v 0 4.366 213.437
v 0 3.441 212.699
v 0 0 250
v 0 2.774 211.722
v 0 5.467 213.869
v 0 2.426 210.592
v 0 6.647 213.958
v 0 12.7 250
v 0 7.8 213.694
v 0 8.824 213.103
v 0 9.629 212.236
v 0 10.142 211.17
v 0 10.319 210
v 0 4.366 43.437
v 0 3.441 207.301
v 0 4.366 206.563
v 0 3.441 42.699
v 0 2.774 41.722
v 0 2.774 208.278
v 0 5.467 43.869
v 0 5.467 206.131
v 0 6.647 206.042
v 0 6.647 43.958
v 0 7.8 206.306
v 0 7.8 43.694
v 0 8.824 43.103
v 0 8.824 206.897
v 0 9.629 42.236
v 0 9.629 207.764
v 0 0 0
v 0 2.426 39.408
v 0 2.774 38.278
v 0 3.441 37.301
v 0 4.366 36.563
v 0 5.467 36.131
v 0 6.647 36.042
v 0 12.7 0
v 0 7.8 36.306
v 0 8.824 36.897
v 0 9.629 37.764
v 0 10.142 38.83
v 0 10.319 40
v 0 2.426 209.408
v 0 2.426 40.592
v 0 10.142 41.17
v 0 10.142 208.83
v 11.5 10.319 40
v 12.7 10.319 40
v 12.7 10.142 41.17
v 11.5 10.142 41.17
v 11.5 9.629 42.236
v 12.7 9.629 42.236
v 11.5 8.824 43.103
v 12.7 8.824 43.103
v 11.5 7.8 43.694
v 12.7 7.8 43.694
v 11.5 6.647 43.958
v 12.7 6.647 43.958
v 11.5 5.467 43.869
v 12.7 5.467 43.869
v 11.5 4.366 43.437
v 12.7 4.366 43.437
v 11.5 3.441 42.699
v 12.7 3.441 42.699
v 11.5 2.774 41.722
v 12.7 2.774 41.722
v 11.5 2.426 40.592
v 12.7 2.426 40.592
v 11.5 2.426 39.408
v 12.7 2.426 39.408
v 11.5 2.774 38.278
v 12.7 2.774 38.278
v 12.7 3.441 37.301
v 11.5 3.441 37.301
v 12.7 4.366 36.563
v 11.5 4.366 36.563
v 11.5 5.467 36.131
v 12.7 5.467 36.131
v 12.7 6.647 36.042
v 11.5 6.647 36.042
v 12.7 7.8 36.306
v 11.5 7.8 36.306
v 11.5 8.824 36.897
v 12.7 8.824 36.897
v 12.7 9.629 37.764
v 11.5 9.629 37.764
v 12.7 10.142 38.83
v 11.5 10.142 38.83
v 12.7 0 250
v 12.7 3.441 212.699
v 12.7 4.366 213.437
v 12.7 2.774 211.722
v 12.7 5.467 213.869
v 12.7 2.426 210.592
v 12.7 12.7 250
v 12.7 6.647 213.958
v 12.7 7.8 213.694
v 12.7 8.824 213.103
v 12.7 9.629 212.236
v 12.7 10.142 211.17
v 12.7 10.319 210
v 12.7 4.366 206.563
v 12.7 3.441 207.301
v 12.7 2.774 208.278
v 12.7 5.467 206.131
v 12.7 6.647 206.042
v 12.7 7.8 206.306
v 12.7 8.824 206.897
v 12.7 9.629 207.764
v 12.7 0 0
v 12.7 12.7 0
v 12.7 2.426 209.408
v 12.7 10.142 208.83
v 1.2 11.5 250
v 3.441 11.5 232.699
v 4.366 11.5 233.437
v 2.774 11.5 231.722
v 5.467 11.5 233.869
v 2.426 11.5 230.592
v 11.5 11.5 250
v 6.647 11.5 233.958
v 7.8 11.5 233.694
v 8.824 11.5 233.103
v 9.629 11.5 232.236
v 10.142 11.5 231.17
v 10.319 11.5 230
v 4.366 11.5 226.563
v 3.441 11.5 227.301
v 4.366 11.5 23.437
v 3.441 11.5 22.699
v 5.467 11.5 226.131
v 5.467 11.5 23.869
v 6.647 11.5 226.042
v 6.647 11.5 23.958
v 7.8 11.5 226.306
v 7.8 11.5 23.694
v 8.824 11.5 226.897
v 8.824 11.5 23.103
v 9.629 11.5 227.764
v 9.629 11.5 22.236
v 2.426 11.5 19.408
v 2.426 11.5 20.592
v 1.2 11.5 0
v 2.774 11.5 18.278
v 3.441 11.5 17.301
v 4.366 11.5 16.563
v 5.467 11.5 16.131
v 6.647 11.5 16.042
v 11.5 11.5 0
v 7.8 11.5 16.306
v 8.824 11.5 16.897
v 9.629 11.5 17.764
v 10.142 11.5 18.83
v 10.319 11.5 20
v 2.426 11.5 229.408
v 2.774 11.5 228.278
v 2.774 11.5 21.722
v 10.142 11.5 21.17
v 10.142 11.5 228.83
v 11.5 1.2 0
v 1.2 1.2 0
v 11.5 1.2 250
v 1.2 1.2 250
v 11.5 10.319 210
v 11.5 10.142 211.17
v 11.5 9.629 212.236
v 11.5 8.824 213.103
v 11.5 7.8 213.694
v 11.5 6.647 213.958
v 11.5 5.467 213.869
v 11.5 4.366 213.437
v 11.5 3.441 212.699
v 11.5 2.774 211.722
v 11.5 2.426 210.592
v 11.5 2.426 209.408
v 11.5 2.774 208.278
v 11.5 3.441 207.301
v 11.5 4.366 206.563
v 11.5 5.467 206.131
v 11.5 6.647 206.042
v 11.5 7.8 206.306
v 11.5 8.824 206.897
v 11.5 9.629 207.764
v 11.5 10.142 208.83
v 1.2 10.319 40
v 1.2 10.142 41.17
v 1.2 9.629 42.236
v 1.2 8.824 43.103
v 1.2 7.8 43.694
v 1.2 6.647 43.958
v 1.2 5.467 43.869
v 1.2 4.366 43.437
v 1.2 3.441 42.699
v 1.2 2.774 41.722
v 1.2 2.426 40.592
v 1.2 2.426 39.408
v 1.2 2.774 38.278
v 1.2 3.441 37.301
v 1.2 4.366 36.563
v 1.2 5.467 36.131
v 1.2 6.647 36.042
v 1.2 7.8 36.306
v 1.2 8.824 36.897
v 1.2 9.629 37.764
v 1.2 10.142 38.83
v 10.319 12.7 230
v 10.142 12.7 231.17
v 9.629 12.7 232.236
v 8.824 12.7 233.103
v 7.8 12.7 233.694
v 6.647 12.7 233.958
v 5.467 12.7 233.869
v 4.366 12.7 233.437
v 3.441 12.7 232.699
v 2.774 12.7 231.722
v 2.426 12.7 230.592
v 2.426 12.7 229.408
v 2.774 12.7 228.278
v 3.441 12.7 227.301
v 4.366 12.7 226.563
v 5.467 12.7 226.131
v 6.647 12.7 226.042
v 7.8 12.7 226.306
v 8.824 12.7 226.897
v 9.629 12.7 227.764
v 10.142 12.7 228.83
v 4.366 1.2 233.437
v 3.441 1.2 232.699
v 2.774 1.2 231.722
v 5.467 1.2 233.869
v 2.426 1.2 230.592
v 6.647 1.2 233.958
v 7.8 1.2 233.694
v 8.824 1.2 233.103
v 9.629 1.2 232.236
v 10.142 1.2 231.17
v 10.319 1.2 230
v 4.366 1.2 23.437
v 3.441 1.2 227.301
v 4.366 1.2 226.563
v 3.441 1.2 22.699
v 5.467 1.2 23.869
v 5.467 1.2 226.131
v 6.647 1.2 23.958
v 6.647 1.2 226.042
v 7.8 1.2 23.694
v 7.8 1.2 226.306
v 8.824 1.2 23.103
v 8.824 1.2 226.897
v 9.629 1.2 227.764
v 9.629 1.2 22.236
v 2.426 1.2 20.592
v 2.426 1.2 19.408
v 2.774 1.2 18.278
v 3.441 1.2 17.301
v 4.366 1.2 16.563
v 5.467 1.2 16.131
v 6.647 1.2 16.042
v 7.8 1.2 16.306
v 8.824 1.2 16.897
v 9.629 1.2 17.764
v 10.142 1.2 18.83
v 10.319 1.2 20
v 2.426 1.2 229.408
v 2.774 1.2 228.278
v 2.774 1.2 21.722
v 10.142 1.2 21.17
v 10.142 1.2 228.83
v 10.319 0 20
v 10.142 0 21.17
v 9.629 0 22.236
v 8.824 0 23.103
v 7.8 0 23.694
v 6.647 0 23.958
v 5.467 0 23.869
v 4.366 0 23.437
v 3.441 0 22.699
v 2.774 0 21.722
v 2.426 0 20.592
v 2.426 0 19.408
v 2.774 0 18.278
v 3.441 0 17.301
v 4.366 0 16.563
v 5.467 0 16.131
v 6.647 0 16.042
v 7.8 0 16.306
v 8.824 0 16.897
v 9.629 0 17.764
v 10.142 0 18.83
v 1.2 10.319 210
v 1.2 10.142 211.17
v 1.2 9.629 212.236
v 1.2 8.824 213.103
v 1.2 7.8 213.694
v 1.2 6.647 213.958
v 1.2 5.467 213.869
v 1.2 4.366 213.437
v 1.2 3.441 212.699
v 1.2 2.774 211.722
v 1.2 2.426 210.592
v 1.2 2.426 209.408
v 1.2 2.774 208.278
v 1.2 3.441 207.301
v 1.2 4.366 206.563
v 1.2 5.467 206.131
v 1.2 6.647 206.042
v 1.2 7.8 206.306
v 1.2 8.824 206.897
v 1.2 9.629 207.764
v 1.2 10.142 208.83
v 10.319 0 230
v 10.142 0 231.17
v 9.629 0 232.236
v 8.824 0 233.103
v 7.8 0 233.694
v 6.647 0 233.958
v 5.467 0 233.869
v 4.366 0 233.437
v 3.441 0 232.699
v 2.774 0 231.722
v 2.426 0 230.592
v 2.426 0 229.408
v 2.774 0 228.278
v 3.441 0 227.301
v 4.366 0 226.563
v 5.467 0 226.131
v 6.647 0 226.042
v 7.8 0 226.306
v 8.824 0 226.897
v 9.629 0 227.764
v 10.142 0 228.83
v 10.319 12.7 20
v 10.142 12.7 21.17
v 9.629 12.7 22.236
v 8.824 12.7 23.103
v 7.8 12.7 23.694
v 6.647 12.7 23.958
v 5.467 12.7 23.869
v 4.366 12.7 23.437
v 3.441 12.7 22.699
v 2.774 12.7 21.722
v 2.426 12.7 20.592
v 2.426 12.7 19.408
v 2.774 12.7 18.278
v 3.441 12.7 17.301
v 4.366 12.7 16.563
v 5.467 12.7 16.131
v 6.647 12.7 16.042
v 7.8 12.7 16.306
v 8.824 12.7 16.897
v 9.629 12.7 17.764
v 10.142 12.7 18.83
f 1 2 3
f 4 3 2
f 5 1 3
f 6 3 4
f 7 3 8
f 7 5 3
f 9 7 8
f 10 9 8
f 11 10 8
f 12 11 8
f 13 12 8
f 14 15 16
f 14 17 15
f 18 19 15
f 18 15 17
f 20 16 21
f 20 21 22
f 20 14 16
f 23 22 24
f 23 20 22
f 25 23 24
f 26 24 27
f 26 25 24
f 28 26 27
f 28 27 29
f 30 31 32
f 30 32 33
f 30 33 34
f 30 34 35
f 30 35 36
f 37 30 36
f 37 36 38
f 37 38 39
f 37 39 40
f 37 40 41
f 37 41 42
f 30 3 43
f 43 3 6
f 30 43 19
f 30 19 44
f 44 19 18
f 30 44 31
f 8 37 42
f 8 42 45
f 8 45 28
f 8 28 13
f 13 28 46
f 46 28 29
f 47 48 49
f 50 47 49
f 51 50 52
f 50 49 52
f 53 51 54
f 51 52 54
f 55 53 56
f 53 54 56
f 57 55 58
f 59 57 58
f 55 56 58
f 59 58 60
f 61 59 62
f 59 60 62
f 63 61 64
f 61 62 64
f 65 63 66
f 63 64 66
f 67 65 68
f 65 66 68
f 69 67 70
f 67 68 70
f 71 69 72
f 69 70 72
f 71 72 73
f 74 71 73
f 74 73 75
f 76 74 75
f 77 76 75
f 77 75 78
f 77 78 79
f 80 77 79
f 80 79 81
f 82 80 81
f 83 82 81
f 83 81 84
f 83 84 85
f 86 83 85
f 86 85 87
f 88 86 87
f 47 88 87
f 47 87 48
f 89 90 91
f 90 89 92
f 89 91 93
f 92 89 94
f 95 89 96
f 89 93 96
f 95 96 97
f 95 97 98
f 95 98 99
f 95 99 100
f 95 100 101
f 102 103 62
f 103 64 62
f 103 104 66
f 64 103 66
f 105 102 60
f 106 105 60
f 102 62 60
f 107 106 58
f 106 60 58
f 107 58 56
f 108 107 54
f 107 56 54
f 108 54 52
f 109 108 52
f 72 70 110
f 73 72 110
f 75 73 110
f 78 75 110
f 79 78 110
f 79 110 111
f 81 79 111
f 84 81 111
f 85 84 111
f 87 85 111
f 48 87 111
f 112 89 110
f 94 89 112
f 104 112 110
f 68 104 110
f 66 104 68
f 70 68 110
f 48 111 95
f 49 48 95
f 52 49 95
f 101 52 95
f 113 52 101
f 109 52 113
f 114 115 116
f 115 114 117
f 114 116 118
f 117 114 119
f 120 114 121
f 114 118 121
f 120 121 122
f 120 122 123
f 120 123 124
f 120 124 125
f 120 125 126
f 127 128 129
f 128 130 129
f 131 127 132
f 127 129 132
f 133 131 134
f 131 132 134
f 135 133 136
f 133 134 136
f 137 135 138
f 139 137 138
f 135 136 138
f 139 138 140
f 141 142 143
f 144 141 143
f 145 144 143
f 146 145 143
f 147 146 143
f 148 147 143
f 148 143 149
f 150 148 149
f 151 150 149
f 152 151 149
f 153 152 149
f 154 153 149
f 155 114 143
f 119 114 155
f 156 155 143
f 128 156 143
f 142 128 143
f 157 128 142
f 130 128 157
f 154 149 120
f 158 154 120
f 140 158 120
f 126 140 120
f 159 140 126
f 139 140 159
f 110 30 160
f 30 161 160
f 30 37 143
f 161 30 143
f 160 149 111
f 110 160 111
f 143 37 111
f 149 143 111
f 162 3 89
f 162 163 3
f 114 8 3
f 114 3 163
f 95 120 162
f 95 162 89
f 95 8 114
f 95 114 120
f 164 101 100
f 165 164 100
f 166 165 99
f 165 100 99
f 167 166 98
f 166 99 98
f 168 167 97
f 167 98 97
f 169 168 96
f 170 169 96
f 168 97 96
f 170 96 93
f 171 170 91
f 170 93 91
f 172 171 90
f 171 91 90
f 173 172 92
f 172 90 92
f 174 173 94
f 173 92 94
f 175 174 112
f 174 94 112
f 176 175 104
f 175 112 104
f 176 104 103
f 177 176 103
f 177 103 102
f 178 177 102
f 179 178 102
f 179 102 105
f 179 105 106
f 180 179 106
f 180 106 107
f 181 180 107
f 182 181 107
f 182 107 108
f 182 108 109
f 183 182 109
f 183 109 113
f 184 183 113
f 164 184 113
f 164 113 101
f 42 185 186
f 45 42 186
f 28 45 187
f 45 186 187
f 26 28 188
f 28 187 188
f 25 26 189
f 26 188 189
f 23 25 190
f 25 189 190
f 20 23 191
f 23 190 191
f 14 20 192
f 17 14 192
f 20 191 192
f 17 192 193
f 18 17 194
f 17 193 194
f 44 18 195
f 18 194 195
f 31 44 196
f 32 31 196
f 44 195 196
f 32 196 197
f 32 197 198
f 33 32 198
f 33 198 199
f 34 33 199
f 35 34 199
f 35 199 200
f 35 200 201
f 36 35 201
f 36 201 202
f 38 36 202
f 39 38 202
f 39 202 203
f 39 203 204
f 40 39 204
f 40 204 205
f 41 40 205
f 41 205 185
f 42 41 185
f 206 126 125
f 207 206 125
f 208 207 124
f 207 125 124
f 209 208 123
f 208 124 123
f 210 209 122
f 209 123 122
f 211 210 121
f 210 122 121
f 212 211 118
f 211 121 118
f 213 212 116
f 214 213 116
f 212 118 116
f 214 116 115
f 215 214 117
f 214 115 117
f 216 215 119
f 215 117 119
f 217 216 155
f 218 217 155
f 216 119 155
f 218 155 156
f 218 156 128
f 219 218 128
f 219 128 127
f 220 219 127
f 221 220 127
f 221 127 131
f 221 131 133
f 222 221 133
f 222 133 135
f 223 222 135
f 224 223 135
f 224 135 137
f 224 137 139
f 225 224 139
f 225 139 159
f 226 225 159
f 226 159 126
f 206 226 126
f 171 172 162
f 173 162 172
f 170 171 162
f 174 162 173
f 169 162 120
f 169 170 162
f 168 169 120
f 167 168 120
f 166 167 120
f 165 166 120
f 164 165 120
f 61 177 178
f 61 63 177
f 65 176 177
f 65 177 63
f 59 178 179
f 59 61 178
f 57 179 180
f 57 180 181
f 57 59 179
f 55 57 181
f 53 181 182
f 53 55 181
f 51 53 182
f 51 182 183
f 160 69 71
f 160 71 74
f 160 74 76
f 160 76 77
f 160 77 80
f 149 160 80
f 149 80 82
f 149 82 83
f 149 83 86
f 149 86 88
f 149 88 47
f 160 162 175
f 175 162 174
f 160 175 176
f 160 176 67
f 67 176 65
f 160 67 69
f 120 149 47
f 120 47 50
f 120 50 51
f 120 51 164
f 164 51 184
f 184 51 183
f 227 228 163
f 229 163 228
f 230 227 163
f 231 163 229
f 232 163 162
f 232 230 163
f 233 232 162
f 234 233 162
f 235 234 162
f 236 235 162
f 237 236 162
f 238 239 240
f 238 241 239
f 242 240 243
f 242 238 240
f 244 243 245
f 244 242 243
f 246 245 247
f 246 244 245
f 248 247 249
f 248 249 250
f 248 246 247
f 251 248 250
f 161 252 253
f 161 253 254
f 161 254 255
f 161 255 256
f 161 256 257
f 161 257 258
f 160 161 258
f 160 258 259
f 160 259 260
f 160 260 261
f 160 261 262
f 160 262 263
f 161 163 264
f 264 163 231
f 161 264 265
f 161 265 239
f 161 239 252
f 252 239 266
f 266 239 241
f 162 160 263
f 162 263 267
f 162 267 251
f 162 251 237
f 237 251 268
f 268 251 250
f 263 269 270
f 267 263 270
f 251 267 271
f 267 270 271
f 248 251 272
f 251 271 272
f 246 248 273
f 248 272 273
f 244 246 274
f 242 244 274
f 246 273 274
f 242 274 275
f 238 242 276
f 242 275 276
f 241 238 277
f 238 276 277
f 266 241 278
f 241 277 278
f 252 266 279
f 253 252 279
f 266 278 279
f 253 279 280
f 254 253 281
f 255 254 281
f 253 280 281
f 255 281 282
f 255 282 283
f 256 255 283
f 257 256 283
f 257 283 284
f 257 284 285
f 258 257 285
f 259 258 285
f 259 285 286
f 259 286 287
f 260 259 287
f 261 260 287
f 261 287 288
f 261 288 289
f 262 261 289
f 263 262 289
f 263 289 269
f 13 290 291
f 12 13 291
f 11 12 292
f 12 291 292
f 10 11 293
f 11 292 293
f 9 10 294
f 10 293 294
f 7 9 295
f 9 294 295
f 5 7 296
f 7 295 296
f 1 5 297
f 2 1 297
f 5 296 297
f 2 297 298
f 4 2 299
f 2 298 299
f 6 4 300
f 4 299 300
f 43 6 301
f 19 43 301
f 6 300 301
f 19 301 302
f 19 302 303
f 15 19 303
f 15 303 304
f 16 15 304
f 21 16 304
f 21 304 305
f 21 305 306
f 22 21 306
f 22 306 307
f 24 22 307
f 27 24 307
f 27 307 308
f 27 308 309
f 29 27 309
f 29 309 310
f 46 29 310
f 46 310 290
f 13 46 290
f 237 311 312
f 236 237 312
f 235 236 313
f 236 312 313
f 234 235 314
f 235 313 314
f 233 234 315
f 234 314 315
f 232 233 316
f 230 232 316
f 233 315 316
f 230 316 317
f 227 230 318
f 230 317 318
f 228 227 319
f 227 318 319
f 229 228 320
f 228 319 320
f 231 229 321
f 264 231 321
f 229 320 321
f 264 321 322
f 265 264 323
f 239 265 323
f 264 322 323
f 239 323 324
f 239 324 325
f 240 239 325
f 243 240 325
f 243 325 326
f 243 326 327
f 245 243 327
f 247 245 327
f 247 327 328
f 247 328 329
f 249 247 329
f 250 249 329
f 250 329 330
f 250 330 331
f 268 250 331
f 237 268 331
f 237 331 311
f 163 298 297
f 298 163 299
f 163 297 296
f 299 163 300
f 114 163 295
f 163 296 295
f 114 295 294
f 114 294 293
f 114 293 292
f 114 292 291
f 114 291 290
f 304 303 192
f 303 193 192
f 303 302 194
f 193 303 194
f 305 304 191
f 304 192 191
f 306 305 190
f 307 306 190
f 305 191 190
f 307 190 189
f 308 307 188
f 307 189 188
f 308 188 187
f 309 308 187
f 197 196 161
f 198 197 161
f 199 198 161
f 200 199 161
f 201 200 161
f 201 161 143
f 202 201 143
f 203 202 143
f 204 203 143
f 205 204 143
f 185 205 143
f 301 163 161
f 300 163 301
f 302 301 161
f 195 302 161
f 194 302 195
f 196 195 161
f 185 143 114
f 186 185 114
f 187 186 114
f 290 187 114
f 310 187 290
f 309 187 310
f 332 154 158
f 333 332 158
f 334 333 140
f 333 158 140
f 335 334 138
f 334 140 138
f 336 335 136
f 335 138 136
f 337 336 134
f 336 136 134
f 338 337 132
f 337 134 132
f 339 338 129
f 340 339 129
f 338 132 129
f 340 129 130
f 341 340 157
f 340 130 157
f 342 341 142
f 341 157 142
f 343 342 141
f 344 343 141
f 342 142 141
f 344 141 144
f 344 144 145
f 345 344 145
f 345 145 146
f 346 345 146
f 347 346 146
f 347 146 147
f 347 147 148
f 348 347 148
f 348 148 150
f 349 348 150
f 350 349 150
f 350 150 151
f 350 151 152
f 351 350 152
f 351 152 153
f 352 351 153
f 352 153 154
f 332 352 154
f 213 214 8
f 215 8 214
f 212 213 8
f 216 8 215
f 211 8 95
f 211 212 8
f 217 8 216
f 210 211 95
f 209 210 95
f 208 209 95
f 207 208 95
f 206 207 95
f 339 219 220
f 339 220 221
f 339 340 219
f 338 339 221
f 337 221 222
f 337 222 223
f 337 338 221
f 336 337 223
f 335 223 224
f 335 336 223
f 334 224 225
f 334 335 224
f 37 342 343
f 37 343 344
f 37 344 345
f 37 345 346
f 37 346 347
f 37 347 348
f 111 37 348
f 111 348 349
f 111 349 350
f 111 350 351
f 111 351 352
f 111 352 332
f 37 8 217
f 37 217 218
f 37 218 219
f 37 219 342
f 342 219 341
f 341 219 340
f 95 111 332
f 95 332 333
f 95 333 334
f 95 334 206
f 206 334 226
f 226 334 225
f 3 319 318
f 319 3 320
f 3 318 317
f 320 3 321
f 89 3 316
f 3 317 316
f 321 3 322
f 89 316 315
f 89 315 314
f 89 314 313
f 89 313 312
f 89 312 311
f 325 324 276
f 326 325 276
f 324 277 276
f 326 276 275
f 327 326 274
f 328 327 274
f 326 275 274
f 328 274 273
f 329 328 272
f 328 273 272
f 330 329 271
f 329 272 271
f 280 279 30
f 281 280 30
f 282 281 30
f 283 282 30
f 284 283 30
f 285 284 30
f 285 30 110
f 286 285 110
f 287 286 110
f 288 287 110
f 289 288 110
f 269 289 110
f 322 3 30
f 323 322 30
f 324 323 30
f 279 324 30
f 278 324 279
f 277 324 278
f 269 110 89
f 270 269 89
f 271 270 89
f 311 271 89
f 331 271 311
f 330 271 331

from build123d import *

# Parameters (mm, degrees)
SKETCH_R         = 3.96875
EXTRUDE001_DEPTH = 12.7
SKETCH001_R      = 3.96875
EXTRUDE_DEPTH    = 12.7
BOX001_W         = 10.3
BOX001_H         = 10.3
BOX001_DEPTH     = 250
BOX_W            = 12.7
BOX_H            = 12.7
BOX_DEPTH        = 250


with BuildPart() as extrude001:
    # Sketch (on Face6 of Cut001) → Extrude001 (new body)
    with BuildSketch(Plane.YZ.offset(12.7)):
        with Locations((6.35, 210)):
            Circle(SKETCH_R)
        with Locations((6.35, 40)):
            Circle(SKETCH_R)
    extrude(amount=-EXTRUDE001_DEPTH)


with BuildPart() as extrude_body:
    # Sketch001 (on Face3 of Box) → Extrude (new body)
    with BuildSketch(Plane.XZ):
        with Locations((6.35, 20)):
            Circle(SKETCH001_R)
        with Locations((6.35, 230)):
            Circle(SKETCH001_R)
    extrude(amount=-EXTRUDE_DEPTH)


with BuildPart() as interno:
    # Box001 → Box001 (new body)
    with BuildSketch(Plane(origin=(1.2, 1.2, 0), x_dir=(1, 0, 0), z_dir=(0, 0, 1))):
        with Locations((5.15, 5.15)):
            Rectangle(BOX001_W, BOX001_H)
    extrude(amount=BOX001_DEPTH)


with BuildPart() as cut002:
    # Box → Box (new body)
    with BuildSketch(Plane.XY):
        with Locations((6.35, 6.35)):
            Rectangle(BOX_W, BOX_H)
    extrude(amount=BOX_DEPTH)

    # Cut: cut interno
    add(interno.part, mode=Mode.SUBTRACT)

    # Cut001: cut Extrude body
    add(extrude_body.part, mode=Mode.SUBTRACT)

    # Cut002: cut Extrude001
    add(extrude001.part, mode=Mode.SUBTRACT)


solid = cut002.part
